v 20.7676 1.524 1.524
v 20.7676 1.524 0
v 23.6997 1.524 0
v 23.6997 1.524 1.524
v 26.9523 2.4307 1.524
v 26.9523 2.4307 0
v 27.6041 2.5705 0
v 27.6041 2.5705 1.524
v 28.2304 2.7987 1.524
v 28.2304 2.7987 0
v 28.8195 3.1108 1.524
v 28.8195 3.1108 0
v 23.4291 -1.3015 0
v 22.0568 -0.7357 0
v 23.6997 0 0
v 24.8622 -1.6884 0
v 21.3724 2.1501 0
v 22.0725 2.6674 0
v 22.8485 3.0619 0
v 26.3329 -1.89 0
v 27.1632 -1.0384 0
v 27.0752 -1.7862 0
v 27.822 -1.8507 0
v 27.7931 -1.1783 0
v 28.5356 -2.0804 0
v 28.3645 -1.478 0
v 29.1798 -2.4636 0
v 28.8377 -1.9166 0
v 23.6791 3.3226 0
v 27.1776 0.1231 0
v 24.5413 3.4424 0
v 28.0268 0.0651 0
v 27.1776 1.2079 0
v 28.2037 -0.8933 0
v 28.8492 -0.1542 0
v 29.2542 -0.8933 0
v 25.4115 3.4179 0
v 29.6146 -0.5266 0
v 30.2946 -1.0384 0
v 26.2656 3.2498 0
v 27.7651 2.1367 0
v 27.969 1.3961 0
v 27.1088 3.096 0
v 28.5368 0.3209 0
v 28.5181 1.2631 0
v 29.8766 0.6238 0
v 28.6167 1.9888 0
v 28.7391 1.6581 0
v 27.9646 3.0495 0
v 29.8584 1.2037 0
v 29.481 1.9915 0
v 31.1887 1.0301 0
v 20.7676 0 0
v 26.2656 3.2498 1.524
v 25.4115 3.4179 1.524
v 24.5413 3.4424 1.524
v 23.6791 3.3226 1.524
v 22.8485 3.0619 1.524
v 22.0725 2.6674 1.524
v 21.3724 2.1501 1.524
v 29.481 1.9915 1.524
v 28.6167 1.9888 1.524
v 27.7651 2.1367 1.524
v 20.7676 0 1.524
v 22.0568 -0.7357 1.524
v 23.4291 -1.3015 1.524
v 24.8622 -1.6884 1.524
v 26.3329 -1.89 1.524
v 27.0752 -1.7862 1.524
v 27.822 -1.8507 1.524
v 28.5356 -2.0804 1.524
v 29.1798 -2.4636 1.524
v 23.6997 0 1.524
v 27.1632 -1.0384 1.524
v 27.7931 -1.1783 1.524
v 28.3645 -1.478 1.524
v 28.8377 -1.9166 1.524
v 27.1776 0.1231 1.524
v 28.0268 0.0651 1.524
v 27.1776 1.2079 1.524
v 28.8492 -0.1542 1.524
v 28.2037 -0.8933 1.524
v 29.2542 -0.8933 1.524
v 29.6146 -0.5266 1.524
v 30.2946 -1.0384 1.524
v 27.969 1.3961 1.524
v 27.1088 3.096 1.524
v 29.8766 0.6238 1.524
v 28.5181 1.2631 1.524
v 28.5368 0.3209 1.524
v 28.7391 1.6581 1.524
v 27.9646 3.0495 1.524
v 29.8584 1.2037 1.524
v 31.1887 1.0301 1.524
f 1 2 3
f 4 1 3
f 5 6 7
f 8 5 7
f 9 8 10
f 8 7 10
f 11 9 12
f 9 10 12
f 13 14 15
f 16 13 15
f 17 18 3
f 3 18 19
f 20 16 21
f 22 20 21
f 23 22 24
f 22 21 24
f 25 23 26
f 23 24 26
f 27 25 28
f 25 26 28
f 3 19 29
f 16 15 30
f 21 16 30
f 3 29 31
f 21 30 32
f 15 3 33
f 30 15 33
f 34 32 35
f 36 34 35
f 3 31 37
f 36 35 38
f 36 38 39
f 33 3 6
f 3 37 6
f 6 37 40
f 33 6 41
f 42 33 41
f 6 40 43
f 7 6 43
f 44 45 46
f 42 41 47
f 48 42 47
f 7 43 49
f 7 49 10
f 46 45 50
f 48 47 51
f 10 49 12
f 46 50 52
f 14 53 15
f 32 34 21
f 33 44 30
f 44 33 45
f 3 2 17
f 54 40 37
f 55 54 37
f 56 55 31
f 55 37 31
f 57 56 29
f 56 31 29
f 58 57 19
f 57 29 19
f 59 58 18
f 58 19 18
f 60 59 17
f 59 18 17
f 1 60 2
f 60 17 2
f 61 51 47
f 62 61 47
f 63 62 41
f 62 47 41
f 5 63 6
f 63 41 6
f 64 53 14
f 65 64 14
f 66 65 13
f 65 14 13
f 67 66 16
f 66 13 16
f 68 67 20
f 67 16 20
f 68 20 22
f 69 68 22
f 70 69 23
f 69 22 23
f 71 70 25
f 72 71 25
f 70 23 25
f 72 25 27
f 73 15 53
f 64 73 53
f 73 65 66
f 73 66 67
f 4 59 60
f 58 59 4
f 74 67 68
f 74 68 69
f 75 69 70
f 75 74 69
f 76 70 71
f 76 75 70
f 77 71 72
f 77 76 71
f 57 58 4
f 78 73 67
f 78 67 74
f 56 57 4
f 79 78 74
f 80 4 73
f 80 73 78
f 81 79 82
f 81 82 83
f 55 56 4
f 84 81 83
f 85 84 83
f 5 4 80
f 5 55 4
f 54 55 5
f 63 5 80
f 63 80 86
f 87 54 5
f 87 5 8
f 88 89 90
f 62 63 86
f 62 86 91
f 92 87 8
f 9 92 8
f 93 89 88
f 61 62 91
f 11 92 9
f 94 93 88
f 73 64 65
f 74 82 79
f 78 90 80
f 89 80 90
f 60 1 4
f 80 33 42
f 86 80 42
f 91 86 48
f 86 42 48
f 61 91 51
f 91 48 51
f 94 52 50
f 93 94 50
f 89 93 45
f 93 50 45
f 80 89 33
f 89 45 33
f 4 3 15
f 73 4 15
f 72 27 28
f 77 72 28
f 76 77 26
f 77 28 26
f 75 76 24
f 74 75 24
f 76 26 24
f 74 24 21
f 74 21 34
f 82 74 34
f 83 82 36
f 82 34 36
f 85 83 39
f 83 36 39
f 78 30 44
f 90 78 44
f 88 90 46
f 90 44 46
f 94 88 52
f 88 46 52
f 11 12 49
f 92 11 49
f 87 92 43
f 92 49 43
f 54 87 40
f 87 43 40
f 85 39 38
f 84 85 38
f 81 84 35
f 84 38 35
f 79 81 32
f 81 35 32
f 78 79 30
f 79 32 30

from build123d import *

# Parameters (mm, degrees)
BOSS_EXTRUDE1_DEPTH = 1.524


with BuildPart() as part:
    # Sketch1 → Boss-Extrude1 (new body)
    with BuildSketch(Plane.XY):
        with BuildLine():
            Line((23.699745488, 1.524), (23.699745488, 0))
            Line((23.699745488, 0), (20.767560847, 0))
            ThreePointArc((20.767560847, 0), (23.42913794, -1.301543103), (26.332873234, -1.890039844))
            ThreePointArc((26.332873234, -1.890039844), (27.822037462, -1.85074691), (29.179825721, -2.463580554))
            ThreePointArc((29.179825721, -2.463580554), (28.364487323, -1.477962315), (27.163224831, -1.038430246))
            ThreePointArc((27.163224831, -1.038430246), (28.728924057, -0.875087412), (30.294623282, -1.038430246))
            ThreePointArc((30.294623282, -1.038430246), (28.84920273, -0.154192624), (27.177608147, 0.123094766))
            ThreePointArc((27.177608147, 0.123094766), (29.209666297, 0.459343802), (31.188707793, 1.03006133))
            ThreePointArc((31.188707793, 1.03006133), (29.188863831, 1.247682511), (27.177608147, 1.207865103))
            ThreePointArc((27.177608147, 1.207865103), (28.357122869, 1.517990015), (29.481047207, 1.991515643))
            ThreePointArc((29.481047207, 1.991515643), (28.187668321, 2.044064099), (26.952298477, 2.430653848))
            ThreePointArc((26.952298477, 2.430653848), (27.921180331, 2.673808335), (28.819454547, 3.110797561))
            ThreePointArc((28.819454547, 3.110797561), (27.535947123, 3.059263221), (26.265619678, 3.249828897))
            ThreePointArc((26.265619678, 3.249828897), (23.258369024, 3.209542673), (20.767560847, 1.524))
            Line((20.767560847, 1.524), (23.699745488, 1.524))
        make_face()
    extrude(amount=BOSS_EXTRUDE1_DEPTH)


solid = part.part
